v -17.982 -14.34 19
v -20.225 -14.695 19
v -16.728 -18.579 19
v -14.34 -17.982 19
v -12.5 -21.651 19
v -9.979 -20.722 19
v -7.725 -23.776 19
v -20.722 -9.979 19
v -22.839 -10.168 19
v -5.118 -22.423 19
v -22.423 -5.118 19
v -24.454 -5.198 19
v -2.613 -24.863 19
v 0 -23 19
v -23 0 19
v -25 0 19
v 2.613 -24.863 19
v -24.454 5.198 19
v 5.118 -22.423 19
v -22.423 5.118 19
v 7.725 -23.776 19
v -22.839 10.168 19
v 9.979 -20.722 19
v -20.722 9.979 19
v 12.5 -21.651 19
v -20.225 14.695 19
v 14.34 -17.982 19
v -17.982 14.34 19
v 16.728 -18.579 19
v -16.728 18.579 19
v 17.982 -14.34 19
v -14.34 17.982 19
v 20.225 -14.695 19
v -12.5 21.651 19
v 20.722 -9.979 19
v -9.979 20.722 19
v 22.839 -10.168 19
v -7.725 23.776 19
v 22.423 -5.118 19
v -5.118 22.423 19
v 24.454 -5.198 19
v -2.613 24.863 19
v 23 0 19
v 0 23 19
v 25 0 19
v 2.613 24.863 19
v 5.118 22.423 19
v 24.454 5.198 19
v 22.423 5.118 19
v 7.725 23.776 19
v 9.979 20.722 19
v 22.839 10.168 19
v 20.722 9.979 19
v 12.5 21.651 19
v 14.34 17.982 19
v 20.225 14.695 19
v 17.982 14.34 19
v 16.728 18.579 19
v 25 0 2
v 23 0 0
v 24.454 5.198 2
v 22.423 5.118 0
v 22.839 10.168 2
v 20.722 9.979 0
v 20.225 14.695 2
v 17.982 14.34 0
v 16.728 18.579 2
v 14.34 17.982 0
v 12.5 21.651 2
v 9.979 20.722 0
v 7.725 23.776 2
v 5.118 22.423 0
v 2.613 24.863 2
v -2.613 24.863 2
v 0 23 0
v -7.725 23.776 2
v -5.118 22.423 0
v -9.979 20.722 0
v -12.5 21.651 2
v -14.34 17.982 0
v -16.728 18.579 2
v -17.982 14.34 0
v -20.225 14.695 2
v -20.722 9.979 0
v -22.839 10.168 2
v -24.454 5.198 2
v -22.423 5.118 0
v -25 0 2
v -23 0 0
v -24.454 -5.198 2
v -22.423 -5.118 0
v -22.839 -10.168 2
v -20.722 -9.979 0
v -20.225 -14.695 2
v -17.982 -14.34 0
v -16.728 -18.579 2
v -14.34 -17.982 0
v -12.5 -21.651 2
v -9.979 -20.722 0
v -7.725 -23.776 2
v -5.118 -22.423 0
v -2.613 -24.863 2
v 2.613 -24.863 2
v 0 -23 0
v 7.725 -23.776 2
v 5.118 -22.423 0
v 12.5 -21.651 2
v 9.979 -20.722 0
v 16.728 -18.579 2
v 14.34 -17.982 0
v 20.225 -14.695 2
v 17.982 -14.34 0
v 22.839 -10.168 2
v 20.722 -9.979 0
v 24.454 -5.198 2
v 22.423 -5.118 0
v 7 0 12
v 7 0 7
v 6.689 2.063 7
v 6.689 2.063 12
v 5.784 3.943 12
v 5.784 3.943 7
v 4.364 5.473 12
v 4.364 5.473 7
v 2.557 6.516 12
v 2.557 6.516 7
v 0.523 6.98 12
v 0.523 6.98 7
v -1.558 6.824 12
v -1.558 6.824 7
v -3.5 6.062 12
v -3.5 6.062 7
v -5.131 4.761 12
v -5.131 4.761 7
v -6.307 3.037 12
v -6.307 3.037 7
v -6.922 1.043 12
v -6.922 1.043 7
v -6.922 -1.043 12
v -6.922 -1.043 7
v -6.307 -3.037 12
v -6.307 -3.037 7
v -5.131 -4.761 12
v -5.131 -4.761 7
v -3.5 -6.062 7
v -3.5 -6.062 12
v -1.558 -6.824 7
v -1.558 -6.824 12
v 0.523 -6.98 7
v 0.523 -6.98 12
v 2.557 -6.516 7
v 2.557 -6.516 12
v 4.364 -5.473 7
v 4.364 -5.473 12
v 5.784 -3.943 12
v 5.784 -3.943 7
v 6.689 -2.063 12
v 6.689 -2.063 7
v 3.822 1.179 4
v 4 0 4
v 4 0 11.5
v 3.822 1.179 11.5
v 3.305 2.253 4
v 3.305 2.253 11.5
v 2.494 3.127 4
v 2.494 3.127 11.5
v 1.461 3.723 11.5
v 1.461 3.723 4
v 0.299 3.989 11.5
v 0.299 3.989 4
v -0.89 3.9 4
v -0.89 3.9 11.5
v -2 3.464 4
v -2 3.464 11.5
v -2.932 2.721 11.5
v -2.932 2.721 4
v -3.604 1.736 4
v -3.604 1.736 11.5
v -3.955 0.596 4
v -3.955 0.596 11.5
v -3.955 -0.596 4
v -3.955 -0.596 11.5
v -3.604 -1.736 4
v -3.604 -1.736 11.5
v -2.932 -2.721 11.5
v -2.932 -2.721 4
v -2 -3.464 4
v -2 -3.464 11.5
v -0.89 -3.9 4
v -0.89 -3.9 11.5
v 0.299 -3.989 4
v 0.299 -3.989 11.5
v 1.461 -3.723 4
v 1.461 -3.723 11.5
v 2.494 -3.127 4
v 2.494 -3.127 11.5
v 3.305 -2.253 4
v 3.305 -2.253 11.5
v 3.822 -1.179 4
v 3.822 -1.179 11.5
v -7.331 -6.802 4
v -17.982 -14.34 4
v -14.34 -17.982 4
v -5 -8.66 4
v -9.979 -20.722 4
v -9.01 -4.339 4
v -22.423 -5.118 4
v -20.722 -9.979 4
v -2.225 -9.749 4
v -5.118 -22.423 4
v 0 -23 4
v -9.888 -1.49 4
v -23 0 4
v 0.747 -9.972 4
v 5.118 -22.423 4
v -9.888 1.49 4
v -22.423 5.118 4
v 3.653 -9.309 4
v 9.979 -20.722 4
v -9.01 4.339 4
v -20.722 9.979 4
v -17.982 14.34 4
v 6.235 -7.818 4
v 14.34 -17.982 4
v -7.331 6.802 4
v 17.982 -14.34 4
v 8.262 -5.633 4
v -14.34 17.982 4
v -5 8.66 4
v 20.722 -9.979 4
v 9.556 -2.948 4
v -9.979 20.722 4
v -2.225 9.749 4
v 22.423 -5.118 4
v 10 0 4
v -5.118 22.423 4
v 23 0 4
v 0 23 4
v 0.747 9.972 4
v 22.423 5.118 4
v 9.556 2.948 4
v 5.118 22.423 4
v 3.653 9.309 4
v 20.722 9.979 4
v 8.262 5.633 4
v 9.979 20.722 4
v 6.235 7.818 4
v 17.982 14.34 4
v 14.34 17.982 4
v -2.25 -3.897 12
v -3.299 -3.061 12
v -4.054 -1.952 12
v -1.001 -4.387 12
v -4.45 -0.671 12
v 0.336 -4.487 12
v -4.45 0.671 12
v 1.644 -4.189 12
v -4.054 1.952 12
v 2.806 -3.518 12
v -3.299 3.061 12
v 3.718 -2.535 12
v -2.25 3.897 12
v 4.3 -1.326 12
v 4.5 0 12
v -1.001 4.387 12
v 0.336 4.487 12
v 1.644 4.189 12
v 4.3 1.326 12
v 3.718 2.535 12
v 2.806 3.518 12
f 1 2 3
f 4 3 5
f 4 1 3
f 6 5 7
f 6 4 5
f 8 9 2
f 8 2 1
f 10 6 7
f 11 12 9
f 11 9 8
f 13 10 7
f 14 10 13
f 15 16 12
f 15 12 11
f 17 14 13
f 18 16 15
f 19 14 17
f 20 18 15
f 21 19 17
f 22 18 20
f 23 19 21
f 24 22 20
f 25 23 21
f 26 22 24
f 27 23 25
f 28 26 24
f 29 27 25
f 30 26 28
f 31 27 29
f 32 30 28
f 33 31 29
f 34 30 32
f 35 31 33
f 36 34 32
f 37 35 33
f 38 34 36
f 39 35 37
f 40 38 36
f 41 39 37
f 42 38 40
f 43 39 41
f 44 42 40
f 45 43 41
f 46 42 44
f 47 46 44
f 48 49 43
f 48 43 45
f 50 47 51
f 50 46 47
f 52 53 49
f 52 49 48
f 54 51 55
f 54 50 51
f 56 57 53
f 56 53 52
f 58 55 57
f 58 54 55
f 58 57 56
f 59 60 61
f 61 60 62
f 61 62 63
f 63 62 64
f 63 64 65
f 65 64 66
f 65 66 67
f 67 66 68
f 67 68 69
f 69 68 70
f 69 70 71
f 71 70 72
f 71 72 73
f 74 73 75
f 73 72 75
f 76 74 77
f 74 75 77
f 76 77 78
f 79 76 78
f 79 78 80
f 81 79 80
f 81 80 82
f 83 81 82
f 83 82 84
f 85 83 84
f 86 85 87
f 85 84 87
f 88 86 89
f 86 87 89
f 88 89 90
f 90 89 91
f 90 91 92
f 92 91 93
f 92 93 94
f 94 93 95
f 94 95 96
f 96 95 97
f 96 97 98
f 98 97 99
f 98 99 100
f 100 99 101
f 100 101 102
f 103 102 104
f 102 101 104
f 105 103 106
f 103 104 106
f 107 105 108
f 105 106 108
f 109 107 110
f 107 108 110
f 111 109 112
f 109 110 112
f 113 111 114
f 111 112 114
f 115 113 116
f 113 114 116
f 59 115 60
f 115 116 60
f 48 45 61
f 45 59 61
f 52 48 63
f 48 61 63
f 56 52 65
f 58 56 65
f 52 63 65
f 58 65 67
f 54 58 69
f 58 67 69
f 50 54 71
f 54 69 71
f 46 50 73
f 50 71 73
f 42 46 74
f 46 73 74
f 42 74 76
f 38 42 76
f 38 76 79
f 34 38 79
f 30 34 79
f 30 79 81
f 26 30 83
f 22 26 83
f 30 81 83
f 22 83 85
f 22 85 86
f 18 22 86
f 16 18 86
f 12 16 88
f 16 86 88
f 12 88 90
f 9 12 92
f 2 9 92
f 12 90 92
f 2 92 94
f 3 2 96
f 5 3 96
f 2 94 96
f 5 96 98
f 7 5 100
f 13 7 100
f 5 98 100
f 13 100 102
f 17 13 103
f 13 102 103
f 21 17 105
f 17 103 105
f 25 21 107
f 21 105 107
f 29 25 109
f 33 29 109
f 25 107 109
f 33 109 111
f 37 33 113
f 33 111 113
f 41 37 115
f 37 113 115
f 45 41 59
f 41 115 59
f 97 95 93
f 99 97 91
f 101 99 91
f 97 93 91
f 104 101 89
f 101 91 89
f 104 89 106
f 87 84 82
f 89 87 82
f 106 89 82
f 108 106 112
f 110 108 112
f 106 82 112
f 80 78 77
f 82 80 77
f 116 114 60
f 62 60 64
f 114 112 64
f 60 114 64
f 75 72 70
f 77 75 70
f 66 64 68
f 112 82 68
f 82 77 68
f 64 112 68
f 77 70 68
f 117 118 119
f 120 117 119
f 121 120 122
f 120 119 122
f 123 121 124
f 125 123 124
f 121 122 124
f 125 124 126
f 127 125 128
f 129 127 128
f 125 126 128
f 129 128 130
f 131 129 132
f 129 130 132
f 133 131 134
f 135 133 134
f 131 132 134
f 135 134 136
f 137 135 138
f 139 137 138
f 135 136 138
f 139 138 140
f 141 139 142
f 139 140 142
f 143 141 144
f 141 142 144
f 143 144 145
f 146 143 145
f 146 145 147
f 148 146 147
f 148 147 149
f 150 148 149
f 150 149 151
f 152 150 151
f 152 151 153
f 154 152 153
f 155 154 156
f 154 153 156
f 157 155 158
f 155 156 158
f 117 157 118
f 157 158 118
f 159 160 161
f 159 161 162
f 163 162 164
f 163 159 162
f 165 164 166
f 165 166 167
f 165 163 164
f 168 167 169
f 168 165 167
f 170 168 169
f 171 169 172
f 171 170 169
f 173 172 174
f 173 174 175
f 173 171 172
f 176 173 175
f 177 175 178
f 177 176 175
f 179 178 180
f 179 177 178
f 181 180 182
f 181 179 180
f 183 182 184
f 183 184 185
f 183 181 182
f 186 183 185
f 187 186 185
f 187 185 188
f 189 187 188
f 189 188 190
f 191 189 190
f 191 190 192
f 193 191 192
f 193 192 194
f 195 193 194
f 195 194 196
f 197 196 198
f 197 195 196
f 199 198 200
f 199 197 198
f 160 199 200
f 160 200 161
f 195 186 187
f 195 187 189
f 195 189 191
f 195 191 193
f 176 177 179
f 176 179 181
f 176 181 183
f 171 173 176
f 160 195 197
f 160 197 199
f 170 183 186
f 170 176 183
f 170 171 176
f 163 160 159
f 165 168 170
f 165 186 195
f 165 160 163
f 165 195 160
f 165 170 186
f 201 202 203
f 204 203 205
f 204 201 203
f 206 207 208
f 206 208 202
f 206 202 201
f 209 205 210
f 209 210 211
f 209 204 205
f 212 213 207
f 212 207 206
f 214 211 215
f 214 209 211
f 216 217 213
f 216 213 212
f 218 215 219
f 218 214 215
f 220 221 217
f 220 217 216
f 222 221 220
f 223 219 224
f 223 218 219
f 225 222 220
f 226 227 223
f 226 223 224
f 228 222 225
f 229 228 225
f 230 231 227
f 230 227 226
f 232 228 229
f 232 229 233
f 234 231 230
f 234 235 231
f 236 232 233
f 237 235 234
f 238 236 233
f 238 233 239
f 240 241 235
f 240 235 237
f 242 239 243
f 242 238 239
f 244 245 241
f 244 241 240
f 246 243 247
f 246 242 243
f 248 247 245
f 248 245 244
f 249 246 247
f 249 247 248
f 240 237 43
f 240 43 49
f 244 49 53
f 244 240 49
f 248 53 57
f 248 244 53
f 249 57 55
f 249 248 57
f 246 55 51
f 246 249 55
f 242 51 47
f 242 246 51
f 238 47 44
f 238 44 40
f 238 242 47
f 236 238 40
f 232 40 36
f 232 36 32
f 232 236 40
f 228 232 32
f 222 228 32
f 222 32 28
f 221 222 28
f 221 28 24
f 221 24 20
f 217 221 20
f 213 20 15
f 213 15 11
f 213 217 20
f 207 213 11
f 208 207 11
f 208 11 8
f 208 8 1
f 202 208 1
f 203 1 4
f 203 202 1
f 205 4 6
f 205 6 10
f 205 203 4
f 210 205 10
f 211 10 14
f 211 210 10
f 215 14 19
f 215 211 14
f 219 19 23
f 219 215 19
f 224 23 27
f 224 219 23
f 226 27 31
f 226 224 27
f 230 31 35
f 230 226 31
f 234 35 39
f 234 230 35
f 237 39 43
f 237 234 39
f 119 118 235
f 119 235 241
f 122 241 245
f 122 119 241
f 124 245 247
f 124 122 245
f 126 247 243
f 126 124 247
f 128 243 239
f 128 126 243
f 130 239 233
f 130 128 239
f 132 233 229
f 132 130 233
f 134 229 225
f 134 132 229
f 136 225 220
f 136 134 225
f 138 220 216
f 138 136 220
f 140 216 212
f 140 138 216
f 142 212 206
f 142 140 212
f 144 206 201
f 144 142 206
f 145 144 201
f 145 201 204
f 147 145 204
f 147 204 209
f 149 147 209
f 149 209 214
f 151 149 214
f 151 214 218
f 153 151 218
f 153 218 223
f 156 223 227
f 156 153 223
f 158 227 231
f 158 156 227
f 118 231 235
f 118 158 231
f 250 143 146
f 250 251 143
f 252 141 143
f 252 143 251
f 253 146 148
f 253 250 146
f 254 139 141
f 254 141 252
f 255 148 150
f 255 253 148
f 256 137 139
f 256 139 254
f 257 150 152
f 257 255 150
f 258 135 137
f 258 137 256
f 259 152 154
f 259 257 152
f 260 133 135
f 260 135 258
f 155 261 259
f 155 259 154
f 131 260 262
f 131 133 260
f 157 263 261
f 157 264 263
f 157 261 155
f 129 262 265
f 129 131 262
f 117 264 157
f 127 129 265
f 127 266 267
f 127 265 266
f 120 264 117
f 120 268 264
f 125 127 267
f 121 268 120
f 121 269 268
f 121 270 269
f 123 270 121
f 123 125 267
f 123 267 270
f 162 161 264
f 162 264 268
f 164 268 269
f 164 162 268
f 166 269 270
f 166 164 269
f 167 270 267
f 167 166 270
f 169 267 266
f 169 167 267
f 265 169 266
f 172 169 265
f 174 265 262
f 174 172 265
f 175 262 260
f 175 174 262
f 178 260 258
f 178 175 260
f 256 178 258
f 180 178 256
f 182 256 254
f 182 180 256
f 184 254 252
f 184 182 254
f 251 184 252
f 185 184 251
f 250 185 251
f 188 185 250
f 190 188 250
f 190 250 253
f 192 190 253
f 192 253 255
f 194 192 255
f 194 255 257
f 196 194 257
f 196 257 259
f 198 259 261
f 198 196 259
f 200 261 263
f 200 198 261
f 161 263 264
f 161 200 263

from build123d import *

# Parameters (mm, degrees)
SKETCH_R        = 25
PAD_DEPTH       = 4
SKETCH001_R     = 7
SKETCH001_R_2   = 4
PAD001_DEPTH    = 8
CHAMFER_SIZE    = 2
CHAMFER001_SIZE = 3
CHAMFER002_SIZE = 0.5
SKETCH002_R     = 25
SKETCH002_R_2   = 23
PAD002_DEPTH    = 15


with BuildPart() as part:
    # Sketch → Pad (new body)
    with BuildSketch(Plane.XY):
        Circle(SKETCH_R)
    extrude(amount=PAD_DEPTH)

    # Sketch001 (on Face3 of Pad) → Pad001 (join)
    with BuildSketch(Plane.XY.offset(4)):
        Circle(SKETCH001_R)
        Circle(SKETCH001_R_2, mode=Mode.SUBTRACT)
    extrude(amount=PAD001_DEPTH)

    # Chamfer
    chamfer_edges = [part.edges().sort_by_distance(p)[0] for p in [
        (-25, 0, 0),
    ]]
    chamfer(chamfer_edges, length=CHAMFER_SIZE)

    # Chamfer001
    chamfer001_edges = [part.edges().sort_by_distance(p)[0] for p in [
        (-7, 0, 4),
    ]]
    chamfer(chamfer001_edges, length=CHAMFER001_SIZE)

    # Chamfer002
    chamfer002_edges = [part.edges().sort_by_distance(p)[0] for p in [
        (-4, 0, 12),
    ]]
    chamfer(chamfer002_edges, length=CHAMFER002_SIZE)

    # Sketch002 (on Face7 of Chamfer002) → Pad002 (join)
    with BuildSketch(Plane.XY.offset(4)):
        Circle(SKETCH002_R)
        Circle(SKETCH002_R_2, mode=Mode.SUBTRACT)
    extrude(amount=PAD002_DEPTH)


solid = part.part
